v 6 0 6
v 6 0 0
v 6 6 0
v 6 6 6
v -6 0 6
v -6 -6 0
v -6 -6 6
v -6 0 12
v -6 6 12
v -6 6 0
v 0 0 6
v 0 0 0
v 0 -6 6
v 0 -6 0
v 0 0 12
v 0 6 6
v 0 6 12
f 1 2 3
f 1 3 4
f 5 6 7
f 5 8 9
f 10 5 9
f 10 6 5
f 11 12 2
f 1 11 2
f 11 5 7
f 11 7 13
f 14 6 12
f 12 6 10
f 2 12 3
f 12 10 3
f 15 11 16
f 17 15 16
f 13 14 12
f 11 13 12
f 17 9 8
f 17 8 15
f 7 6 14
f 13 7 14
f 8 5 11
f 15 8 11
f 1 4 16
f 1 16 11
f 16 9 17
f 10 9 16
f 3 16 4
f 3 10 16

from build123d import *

# Parameters (mm, degrees)
F0_W      = 6
F0_H      = 6
F1_DEPTH  = 6
F1_FACE_W = 6
F1_FACE_H = 6
F5_W      = 6
F5_H      = 6
F6_DEPTH  = 6
F7_W      = 6
F7_H      = 6
F8_DEPTH  = 6


with BuildPart() as f1:
    # F0 (on Top) → F1 (new body)
    with BuildSketch(Plane.XY):
        with Locations((-3, 3)):
            Rectangle(F0_W, F0_H)
    extrude(amount=F1_DEPTH)

    # F3: sweep along a path in F2
    with BuildLine(Plane.XY) as f3_path:
        Line((0, 3.029319), (6, 3.029319))
    # F1_face (on face) → F3 (sweep)
    with BuildSketch(Plane(origin=(0, 3, 3), x_dir=(0, 1, 0), z_dir=(1, 0, 0))):
        Rectangle(F1_FACE_W, F1_FACE_H)
    sweep(path=f3_path.line)

    # F5 (on offset) → F6 (join)
    with BuildSketch(Plane.XY.offset(6)):
        with Locations((-3, 3)):
            Rectangle(F5_W, F5_H)
    extrude(amount=F6_DEPTH)

    # F7 (on Top) → F8 (join)
    with BuildSketch(Plane.XY):
        with Locations((-3, -3)):
            Rectangle(F7_W, F7_H)
    extrude(amount=F8_DEPTH)


solid = f1.part
